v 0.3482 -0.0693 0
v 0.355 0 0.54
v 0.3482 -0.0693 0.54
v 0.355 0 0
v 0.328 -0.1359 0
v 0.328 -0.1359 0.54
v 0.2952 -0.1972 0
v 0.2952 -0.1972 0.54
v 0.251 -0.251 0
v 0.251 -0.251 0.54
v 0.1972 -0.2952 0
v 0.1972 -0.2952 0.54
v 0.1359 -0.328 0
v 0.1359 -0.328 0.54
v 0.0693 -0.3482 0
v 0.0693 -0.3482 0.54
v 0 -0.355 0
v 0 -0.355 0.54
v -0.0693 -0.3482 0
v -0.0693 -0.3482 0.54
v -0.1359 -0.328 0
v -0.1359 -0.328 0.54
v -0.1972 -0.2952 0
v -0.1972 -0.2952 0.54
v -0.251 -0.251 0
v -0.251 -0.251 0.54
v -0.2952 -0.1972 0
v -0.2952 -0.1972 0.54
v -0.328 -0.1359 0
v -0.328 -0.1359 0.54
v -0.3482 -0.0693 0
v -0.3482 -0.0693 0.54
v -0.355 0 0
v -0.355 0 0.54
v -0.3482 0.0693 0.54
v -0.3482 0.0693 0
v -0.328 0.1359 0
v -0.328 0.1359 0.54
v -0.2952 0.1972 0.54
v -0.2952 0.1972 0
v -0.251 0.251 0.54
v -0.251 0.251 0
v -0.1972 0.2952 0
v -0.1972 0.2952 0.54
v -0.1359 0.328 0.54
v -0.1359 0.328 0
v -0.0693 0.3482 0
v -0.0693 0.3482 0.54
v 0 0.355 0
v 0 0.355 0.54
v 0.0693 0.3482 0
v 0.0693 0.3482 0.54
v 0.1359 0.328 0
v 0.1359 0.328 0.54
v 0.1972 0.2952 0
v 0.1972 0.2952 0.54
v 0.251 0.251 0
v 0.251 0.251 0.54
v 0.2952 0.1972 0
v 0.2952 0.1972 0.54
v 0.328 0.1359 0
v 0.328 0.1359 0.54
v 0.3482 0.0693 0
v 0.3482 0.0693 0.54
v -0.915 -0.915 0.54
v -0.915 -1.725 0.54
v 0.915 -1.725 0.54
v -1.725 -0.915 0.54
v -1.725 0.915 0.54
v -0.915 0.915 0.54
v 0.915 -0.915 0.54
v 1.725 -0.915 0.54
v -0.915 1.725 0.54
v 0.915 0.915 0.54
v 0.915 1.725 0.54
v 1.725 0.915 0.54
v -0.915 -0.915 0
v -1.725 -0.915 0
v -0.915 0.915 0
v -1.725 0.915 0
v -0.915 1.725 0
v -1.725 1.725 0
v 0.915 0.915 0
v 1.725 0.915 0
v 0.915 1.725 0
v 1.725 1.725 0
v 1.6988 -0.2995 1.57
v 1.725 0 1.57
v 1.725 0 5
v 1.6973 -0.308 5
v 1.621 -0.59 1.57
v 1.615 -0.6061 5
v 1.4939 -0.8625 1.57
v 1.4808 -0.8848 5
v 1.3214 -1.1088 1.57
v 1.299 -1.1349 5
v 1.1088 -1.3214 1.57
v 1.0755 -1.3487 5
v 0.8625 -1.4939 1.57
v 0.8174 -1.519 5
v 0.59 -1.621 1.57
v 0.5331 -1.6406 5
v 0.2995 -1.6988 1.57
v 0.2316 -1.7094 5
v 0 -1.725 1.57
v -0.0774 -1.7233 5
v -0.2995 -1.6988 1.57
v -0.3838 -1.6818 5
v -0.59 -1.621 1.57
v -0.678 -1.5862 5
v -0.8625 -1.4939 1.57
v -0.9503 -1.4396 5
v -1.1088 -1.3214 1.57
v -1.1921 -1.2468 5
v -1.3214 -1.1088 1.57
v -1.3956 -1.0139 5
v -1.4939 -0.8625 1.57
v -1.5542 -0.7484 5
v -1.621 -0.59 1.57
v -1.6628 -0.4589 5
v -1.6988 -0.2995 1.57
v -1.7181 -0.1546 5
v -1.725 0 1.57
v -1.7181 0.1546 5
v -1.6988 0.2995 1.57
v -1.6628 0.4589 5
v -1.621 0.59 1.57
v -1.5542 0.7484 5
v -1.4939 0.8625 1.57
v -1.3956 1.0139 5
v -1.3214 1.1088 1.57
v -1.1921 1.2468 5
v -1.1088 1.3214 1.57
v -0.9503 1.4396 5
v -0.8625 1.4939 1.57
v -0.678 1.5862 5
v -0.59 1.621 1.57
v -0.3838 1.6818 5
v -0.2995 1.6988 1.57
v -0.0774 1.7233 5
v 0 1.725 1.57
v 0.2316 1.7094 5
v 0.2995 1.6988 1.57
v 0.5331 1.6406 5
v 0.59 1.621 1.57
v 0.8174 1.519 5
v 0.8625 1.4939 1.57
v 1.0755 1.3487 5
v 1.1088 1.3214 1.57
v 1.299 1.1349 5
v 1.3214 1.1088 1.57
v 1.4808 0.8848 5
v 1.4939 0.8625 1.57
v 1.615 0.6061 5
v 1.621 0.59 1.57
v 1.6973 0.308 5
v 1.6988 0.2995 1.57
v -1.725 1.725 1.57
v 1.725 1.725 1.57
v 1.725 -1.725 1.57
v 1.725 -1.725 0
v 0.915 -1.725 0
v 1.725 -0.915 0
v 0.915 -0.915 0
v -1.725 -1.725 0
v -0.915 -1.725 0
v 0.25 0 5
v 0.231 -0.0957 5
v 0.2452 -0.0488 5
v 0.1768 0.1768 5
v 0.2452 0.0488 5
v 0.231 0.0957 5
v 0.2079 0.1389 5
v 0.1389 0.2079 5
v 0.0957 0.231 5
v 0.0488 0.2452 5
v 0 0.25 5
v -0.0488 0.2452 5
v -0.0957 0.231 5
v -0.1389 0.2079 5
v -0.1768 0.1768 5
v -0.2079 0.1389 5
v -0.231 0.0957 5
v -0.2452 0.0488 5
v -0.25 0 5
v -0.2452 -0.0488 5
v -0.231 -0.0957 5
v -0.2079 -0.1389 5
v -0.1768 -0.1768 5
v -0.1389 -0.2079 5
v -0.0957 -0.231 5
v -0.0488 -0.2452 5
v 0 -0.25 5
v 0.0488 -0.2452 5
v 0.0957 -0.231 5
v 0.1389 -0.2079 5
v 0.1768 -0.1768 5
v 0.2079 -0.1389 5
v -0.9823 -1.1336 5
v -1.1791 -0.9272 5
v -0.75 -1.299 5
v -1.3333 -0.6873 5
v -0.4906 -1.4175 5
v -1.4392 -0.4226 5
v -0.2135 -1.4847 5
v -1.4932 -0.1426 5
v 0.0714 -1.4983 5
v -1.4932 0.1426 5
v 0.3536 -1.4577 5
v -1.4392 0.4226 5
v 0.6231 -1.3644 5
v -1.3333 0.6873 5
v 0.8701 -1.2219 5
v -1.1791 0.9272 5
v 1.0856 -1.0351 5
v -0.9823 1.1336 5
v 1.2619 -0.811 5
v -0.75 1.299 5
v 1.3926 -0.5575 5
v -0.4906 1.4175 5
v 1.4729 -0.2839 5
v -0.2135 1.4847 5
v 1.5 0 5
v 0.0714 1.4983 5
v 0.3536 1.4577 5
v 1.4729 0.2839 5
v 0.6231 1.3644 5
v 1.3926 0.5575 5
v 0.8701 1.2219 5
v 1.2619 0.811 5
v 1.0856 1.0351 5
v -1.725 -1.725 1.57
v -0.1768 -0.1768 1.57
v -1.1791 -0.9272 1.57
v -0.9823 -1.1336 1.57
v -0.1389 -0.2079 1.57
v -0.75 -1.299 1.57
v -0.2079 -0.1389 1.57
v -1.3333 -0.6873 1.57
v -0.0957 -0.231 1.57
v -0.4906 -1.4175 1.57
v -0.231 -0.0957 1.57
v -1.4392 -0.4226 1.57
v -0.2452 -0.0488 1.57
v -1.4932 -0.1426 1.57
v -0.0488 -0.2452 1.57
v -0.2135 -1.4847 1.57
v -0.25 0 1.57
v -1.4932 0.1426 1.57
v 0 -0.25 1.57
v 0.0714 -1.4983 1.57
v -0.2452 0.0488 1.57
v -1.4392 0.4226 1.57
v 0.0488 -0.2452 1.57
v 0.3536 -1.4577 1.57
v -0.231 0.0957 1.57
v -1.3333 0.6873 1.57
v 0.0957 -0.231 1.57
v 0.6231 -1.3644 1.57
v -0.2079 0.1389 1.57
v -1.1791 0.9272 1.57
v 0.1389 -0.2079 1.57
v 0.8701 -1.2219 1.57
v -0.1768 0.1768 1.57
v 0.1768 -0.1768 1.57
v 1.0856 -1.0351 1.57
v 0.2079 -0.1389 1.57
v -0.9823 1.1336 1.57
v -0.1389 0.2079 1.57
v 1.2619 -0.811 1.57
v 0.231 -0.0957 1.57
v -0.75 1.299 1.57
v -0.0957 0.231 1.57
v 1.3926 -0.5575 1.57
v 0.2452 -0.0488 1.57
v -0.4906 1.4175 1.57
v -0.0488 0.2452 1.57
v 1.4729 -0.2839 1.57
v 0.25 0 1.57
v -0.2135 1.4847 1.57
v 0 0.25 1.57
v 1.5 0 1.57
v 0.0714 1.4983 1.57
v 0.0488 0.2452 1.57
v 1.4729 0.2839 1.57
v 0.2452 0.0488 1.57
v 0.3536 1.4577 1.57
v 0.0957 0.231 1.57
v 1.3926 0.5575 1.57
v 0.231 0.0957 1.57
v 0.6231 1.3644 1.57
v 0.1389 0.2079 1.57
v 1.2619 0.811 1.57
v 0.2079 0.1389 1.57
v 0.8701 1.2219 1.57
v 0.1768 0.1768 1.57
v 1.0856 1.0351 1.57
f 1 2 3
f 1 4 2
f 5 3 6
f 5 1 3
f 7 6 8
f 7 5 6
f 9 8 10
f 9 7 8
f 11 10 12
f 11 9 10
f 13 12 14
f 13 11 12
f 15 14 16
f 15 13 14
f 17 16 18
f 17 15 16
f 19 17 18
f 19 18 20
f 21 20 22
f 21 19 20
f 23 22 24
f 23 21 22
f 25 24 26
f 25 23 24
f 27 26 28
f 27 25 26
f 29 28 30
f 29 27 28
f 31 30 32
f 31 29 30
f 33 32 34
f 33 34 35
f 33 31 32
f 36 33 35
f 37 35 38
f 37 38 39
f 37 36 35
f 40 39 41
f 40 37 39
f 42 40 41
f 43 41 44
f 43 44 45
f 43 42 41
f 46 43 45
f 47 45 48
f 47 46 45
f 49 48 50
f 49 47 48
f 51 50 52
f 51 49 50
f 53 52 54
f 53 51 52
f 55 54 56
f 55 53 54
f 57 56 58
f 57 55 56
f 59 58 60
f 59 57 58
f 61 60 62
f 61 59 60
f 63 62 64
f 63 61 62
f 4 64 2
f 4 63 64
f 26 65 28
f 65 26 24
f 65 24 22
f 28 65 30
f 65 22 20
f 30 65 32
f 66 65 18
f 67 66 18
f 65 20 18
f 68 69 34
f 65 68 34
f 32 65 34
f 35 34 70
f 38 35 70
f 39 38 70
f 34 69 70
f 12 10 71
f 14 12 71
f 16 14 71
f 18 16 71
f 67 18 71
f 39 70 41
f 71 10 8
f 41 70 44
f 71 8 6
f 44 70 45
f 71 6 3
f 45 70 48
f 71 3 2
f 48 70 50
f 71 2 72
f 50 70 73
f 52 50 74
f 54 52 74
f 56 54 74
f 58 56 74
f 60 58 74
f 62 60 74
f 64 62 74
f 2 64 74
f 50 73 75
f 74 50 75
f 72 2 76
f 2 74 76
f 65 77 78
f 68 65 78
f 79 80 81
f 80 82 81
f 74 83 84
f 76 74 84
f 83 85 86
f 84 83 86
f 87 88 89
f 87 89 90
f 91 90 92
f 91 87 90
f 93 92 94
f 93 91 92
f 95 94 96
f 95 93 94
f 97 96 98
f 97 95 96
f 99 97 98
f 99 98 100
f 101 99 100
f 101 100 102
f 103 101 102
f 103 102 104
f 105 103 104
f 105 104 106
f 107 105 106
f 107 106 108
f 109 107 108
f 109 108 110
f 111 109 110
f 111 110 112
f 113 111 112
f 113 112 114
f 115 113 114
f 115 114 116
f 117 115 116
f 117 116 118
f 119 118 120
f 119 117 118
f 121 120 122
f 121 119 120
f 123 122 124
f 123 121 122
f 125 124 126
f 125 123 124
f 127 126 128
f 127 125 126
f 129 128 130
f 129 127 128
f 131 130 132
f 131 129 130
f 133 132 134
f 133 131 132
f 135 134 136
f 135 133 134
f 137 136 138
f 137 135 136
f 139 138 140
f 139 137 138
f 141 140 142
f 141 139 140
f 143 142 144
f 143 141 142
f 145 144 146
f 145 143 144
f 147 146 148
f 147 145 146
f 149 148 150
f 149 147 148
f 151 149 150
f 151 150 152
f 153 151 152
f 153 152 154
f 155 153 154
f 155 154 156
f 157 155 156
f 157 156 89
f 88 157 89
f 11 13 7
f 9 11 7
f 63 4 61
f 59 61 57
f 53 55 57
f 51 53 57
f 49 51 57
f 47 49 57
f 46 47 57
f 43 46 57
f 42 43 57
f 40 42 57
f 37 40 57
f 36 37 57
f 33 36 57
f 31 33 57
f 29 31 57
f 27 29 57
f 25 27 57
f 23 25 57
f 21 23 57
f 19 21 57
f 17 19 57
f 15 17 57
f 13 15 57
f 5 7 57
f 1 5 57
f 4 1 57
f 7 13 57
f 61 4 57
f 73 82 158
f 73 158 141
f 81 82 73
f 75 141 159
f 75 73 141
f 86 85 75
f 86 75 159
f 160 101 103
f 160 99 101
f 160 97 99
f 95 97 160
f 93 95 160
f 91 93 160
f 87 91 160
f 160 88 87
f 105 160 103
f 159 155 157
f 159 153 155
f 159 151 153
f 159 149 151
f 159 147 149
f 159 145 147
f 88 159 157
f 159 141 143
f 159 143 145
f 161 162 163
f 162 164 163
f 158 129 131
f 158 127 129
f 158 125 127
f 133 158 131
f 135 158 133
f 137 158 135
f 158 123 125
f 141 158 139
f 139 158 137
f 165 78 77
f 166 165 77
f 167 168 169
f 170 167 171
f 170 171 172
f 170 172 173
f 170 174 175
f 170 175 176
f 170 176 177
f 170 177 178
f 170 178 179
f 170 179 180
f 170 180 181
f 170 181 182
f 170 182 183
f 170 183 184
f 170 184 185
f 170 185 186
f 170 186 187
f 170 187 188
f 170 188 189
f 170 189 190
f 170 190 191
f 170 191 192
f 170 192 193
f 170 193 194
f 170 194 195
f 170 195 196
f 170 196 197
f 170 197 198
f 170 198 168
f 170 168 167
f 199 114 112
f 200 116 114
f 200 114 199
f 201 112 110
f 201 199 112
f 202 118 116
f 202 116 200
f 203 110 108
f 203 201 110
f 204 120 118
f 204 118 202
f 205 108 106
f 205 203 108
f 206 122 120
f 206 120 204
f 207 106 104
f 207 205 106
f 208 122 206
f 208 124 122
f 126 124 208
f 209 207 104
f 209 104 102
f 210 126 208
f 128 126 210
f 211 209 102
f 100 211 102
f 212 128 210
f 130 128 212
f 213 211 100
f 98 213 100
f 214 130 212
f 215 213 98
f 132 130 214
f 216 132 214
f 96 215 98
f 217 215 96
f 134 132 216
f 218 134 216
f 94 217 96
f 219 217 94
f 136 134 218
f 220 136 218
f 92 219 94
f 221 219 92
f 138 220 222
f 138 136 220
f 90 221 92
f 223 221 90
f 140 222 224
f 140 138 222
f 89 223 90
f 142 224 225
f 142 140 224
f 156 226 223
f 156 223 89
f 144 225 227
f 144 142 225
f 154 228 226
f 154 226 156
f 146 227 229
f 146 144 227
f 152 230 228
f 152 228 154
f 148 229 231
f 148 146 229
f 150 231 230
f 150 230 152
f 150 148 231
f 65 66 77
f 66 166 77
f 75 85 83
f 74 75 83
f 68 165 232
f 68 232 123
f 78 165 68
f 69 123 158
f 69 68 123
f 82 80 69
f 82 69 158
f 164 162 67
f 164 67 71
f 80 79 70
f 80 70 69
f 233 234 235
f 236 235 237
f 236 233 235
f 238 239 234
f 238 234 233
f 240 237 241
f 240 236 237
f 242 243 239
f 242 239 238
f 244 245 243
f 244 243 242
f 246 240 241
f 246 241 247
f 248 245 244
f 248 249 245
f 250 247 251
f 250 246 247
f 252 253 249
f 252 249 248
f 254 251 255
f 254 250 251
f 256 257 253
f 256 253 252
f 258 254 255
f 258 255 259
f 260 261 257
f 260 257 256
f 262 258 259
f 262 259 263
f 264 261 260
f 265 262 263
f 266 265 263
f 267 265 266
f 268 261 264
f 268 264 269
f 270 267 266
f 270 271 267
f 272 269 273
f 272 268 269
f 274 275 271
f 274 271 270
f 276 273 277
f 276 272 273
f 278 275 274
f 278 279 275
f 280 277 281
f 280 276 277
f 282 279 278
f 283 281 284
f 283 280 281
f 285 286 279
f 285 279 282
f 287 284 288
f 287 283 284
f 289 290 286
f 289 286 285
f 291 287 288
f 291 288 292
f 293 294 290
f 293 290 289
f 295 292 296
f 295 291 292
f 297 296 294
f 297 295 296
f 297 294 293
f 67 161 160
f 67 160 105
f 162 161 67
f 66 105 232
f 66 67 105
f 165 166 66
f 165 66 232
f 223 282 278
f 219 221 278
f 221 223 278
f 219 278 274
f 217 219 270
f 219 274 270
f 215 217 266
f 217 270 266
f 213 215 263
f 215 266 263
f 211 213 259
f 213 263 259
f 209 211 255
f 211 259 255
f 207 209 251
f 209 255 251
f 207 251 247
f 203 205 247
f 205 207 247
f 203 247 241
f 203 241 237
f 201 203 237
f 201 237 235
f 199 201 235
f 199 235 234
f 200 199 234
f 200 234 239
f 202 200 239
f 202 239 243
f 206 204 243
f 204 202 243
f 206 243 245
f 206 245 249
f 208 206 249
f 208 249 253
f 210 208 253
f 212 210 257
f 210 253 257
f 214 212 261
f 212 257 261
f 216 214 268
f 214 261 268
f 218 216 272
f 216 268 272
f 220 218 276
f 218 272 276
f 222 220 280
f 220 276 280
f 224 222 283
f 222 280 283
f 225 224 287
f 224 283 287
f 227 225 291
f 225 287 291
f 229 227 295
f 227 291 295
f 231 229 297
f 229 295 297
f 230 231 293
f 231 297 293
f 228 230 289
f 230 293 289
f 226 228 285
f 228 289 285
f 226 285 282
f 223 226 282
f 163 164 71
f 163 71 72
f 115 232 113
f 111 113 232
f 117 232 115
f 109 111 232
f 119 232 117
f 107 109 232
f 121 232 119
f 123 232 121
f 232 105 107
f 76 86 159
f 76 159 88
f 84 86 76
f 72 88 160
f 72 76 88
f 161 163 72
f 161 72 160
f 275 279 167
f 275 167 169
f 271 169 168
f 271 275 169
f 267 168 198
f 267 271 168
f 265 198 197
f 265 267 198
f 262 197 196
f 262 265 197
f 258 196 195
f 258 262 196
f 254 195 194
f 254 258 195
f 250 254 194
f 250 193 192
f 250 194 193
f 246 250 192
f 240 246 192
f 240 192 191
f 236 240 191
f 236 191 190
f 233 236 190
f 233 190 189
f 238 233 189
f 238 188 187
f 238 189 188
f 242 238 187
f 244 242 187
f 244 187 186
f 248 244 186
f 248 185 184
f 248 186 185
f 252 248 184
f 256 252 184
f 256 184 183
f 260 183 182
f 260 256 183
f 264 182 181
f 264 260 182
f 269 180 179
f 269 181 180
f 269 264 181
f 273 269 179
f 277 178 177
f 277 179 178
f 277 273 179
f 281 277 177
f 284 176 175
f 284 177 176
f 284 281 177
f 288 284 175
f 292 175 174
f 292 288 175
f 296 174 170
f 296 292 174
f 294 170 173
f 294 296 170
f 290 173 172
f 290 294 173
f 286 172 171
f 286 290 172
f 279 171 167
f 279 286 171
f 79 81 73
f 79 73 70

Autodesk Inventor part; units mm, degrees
ref_plane "YZ Plane" through (0, 0, 0) normal (1, 0, 0) x (0, 1, 0)
ref_plane "XZ Plane" through (0, 0, 0) normal (0, 1, 0) x (-1, 0, 0)
sketch "Sketch1" plane through (0, 0, 0) normal (0, 0, 1) x (1, 0, 0)
  line L0 (0, 0) -> (0.4099, 0)
  line L1 (0, 0) -> (0, 0.6993)
  circle A0 centre (0, 0) radius 0.355
  line L2 (-1.725, 1.725) -> (1.725, 1.725) construction
  line L3 (1.725, 1.725) -> (1.725, -1.725) construction
  line L4 (1.725, -1.725) -> (-1.725, -1.725) construction
  line L5 (-1.725, -1.725) -> (-1.725, 1.725) construction
  line L6 (-1.725, 1.725) -> (-0.915, 1.725)
  line L7 (-0.915, 1.725) -> (-0.915, 0.915)
  line L8 (-0.915, 0.915) -> (-1.725, 0.915)
  line L9 (-1.725, 0.915) -> (-1.725, 1.725)
  line L10 (-1.725, -1.725) -> (-0.915, -1.725)
  line L11 (-0.915, -1.725) -> (-0.915, -0.915)
  line L12 (-0.915, -0.915) -> (-1.725, -0.915)
  line L13 (-1.725, -0.915) -> (-1.725, -1.725)
  line L14 (1.725, -1.725) -> (0.915, -1.725)
  line L15 (0.915, -1.725) -> (0.915, -0.915)
  line L16 (0.915, -0.915) -> (1.725, -0.915)
  line L17 (1.725, -0.915) -> (1.725, -1.725)
  line L18 (1.725, 1.725) -> (0.915, 1.725)
  line L19 (0.915, 1.725) -> (0.915, 0.915)
  line L20 (0.915, 0.915) -> (1.725, 0.915)
  line L21 (1.725, 0.915) -> (1.725, 1.725)
  dimension "d25" = 3.45
  dimension "d26" = 3.45
  dimension "d27" = 0.81
  dimension "d28" = 0.71
extrude "Extrusion1" add sketch "Sketch1" along normal blind 0.54
ref_plane "Work Plane2" through (0, 0, 0.54) normal (0, 0, 1) x (1, 0, 0)
sketch "Sketch2" plane through (0, 0, 0.54) normal (0, 0, 1) x (1, 0, 0)
  line L0 (-1.725, 1.725) -> (1.725, 1.725)
  line L1 (1.725, 1.725) -> (1.725, -1.725)
  line L2 (1.725, -1.725) -> (-1.725, -1.725)
  line L3 (-1.725, -1.725) -> (-1.725, 1.725)
  line L4 (0, 0) -> (0.4406, 0)
  line L5 (0, 0) -> (0, 0.4944)
extrude "Extrusion2" add sketch "Sketch2" along normal blind 1.03
sketch "Sketch3" plane through (0, 0, 1.57) normal (0, 0, 1) x (1, 0, 0)
  circle A0 centre (0, 0) radius 1.725
  circle A1 centre (0, 0) radius 1.5
  circle A2 centre (0, 0) radius 0.25
  dimension "d20" = 0.5
  dimension "d21" = 3.45
  dimension "d22" = 3
extrude "Extrusion3" add sketch "Sketch3" along normal blind 3.43
properties part number "MOLEX 73415-2061" material "Brass, Soft Yellow"
